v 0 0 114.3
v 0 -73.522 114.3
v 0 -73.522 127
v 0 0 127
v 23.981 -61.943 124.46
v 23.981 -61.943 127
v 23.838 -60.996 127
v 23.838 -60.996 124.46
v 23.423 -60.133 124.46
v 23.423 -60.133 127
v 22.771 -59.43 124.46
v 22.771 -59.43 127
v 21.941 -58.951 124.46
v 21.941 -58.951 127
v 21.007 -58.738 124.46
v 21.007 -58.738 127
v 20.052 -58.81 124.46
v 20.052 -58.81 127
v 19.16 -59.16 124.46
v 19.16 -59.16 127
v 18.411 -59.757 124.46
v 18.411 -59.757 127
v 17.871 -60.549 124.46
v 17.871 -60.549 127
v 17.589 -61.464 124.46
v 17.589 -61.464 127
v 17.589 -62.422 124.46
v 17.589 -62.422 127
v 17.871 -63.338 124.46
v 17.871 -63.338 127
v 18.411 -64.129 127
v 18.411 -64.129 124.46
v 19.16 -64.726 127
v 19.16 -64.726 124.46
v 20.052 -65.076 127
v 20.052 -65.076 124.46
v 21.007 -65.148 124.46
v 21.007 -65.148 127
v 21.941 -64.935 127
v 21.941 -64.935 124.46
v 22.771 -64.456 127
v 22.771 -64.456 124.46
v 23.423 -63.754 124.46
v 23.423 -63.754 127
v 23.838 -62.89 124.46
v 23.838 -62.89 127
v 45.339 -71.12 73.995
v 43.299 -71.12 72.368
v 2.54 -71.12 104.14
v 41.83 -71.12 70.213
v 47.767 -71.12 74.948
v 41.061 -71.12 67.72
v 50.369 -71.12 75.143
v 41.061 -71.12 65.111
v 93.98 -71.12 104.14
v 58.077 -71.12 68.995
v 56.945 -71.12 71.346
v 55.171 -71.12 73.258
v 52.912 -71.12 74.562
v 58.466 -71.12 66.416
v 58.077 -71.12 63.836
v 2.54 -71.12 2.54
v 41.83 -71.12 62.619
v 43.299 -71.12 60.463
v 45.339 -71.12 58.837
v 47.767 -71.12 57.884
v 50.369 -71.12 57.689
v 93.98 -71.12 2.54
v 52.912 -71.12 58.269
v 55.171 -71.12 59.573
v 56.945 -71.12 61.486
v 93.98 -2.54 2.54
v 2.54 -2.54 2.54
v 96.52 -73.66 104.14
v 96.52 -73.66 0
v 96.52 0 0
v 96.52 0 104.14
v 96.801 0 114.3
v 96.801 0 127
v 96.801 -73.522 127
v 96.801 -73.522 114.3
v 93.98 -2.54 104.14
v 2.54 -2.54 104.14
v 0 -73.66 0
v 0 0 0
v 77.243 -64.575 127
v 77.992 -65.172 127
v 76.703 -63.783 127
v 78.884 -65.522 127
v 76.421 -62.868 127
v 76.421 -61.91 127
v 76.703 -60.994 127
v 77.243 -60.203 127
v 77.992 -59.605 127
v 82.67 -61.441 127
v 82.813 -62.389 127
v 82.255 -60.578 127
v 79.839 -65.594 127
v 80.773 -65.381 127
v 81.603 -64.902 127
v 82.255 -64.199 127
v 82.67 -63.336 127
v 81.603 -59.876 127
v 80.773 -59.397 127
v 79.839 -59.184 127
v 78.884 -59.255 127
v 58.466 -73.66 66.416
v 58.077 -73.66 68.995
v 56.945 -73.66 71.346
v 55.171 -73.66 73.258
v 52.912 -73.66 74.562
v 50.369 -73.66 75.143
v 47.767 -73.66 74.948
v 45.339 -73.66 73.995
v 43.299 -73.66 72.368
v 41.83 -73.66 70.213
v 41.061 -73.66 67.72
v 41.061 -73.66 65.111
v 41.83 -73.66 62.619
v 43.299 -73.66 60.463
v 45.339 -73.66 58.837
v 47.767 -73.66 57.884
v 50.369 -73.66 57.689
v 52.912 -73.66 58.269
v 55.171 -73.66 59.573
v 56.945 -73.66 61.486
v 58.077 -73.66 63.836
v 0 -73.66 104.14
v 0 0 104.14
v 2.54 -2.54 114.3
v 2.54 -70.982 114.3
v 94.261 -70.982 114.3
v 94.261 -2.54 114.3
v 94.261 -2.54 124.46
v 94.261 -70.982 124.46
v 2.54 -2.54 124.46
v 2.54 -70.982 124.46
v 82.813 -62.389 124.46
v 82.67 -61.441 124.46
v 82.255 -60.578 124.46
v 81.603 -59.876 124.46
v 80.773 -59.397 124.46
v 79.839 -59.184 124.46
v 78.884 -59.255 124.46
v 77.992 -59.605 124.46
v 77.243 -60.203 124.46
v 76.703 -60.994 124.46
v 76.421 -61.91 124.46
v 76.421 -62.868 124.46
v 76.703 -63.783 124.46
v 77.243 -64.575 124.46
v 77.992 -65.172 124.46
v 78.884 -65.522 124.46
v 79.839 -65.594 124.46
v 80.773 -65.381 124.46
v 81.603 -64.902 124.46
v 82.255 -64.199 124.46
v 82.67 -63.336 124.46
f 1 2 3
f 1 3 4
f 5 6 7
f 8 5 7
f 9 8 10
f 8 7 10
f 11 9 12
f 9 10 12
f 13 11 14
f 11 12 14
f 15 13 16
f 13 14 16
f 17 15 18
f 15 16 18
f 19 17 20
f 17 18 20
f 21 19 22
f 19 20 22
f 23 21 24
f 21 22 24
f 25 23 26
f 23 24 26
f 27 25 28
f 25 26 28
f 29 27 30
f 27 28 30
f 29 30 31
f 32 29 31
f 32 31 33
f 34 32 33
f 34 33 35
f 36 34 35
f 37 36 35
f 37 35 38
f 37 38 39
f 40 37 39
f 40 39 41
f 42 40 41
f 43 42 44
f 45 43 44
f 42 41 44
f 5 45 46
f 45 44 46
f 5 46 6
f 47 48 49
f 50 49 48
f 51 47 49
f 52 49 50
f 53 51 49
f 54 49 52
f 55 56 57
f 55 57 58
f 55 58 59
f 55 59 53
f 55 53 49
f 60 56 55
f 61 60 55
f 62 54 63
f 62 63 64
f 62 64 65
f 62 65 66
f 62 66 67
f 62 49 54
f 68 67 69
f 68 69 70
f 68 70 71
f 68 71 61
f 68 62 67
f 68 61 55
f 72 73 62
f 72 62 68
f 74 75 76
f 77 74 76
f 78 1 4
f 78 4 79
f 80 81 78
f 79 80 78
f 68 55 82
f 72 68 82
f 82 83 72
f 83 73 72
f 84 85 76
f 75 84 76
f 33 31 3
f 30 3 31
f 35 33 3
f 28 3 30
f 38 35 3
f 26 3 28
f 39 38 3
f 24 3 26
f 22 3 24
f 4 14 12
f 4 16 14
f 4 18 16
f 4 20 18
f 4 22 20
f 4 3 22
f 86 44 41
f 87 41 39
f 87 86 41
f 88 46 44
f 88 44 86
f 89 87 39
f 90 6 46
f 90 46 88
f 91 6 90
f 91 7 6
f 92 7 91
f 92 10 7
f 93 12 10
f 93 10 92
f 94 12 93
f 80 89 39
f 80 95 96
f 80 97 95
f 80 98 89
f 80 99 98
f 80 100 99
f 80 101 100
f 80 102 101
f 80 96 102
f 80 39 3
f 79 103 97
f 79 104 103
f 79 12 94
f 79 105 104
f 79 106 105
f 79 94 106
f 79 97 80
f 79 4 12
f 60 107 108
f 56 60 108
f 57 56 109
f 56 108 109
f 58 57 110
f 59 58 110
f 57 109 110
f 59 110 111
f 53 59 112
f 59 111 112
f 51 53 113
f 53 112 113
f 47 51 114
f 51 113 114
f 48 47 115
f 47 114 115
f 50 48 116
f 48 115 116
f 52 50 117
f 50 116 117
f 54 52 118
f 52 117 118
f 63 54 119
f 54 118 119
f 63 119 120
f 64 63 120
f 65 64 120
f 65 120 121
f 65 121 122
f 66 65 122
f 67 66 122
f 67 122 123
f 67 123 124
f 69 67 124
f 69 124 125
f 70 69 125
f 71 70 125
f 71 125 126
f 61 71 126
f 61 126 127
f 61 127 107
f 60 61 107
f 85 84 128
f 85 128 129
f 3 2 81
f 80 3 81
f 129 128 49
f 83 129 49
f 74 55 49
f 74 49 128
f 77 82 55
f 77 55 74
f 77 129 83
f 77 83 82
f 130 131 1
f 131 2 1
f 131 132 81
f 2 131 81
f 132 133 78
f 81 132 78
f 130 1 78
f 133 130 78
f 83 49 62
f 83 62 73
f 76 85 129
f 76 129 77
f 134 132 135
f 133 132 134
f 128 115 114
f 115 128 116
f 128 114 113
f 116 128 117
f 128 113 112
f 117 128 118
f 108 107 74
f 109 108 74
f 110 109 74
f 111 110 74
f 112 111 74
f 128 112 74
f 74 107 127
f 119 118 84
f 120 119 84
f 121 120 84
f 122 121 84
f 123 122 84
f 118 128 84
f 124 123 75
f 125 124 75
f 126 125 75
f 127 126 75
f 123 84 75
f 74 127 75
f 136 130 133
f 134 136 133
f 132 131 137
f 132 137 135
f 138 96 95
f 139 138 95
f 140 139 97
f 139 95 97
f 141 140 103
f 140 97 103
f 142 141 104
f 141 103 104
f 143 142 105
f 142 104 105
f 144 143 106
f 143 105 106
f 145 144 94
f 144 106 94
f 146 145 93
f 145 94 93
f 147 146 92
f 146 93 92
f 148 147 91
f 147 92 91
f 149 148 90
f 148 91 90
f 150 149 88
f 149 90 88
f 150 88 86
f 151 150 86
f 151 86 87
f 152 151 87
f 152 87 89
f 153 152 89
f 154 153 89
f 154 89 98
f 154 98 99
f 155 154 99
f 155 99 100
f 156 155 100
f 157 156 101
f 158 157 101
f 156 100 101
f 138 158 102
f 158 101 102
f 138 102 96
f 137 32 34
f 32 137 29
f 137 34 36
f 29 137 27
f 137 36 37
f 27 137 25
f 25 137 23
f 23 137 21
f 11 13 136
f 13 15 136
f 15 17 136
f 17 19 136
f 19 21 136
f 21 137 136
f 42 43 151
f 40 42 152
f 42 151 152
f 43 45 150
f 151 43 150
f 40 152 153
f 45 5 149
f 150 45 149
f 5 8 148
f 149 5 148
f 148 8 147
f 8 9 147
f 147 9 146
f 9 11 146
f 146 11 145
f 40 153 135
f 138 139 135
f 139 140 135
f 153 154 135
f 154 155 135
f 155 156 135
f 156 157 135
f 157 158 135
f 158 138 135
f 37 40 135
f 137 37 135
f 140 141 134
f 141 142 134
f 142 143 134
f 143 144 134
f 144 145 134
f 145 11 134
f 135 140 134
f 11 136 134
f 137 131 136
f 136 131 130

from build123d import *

# Parameters (mm, degrees)
F0_W      = 96.52
F0_H      = 73.66
F1_DEPTH  = 104.14
F2_T      = -2.54
F3_R      = 8.751664
F4_DEPTH  = 25.4
F6_W      = 96.800506
F6_H      = 73.522486
F7_DEPTH  = 12.7
F8_T      = -2.54
F9_R      = 3.213962
F10_DEPTH = 2.54


with BuildPart() as f1:
    # F0 (on Top) → F1 (new body)
    with BuildSketch(Plane.XY):
        with Locations((48.26, -36.83)):
            Rectangle(F0_W, F0_H)
    extrude(amount=F1_DEPTH)

    # F2
    f2_openings = [f1.faces().sort_by_distance(p)[0] for p in [
        (48.26, -36.83, 104.14),
    ]]
    offset(amount=F2_T, openings=f2_openings)

    # F3 (on face) → F4 (cut)
    with BuildSketch(Plane.XZ.offset(73.66)):
        with Locations((49.714513, 66.415764)):
            Circle(F3_R)
    extrude(amount=-F4_DEPTH, mode=Mode.SUBTRACT)


with BuildPart() as f7:
    # F6 (on offset) → F7 (new body)
    with BuildSketch(Plane.XY.offset(114.3)):
        with Locations((48.400253, -36.761243)):
            Rectangle(F6_W, F6_H)
    extrude(amount=F7_DEPTH)

    # F8
    f8_openings = [f7.faces().sort_by_distance(p)[0] for p in [
        (48.400253, -36.761243, 114.3),
    ]]
    offset(amount=F8_T, openings=f8_openings)

    # F9 (on face) → F10 (cut)
    with BuildSketch(Plane.XY.offset(127)):
        with Locations((20.767065, -61.943103)):
            Circle(F9_R)
        with Locations((79.599023, -62.388796)):
            Circle(F9_R)
    extrude(amount=-F10_DEPTH, mode=Mode.SUBTRACT)


solid = Compound([f1.part, f7.part])
